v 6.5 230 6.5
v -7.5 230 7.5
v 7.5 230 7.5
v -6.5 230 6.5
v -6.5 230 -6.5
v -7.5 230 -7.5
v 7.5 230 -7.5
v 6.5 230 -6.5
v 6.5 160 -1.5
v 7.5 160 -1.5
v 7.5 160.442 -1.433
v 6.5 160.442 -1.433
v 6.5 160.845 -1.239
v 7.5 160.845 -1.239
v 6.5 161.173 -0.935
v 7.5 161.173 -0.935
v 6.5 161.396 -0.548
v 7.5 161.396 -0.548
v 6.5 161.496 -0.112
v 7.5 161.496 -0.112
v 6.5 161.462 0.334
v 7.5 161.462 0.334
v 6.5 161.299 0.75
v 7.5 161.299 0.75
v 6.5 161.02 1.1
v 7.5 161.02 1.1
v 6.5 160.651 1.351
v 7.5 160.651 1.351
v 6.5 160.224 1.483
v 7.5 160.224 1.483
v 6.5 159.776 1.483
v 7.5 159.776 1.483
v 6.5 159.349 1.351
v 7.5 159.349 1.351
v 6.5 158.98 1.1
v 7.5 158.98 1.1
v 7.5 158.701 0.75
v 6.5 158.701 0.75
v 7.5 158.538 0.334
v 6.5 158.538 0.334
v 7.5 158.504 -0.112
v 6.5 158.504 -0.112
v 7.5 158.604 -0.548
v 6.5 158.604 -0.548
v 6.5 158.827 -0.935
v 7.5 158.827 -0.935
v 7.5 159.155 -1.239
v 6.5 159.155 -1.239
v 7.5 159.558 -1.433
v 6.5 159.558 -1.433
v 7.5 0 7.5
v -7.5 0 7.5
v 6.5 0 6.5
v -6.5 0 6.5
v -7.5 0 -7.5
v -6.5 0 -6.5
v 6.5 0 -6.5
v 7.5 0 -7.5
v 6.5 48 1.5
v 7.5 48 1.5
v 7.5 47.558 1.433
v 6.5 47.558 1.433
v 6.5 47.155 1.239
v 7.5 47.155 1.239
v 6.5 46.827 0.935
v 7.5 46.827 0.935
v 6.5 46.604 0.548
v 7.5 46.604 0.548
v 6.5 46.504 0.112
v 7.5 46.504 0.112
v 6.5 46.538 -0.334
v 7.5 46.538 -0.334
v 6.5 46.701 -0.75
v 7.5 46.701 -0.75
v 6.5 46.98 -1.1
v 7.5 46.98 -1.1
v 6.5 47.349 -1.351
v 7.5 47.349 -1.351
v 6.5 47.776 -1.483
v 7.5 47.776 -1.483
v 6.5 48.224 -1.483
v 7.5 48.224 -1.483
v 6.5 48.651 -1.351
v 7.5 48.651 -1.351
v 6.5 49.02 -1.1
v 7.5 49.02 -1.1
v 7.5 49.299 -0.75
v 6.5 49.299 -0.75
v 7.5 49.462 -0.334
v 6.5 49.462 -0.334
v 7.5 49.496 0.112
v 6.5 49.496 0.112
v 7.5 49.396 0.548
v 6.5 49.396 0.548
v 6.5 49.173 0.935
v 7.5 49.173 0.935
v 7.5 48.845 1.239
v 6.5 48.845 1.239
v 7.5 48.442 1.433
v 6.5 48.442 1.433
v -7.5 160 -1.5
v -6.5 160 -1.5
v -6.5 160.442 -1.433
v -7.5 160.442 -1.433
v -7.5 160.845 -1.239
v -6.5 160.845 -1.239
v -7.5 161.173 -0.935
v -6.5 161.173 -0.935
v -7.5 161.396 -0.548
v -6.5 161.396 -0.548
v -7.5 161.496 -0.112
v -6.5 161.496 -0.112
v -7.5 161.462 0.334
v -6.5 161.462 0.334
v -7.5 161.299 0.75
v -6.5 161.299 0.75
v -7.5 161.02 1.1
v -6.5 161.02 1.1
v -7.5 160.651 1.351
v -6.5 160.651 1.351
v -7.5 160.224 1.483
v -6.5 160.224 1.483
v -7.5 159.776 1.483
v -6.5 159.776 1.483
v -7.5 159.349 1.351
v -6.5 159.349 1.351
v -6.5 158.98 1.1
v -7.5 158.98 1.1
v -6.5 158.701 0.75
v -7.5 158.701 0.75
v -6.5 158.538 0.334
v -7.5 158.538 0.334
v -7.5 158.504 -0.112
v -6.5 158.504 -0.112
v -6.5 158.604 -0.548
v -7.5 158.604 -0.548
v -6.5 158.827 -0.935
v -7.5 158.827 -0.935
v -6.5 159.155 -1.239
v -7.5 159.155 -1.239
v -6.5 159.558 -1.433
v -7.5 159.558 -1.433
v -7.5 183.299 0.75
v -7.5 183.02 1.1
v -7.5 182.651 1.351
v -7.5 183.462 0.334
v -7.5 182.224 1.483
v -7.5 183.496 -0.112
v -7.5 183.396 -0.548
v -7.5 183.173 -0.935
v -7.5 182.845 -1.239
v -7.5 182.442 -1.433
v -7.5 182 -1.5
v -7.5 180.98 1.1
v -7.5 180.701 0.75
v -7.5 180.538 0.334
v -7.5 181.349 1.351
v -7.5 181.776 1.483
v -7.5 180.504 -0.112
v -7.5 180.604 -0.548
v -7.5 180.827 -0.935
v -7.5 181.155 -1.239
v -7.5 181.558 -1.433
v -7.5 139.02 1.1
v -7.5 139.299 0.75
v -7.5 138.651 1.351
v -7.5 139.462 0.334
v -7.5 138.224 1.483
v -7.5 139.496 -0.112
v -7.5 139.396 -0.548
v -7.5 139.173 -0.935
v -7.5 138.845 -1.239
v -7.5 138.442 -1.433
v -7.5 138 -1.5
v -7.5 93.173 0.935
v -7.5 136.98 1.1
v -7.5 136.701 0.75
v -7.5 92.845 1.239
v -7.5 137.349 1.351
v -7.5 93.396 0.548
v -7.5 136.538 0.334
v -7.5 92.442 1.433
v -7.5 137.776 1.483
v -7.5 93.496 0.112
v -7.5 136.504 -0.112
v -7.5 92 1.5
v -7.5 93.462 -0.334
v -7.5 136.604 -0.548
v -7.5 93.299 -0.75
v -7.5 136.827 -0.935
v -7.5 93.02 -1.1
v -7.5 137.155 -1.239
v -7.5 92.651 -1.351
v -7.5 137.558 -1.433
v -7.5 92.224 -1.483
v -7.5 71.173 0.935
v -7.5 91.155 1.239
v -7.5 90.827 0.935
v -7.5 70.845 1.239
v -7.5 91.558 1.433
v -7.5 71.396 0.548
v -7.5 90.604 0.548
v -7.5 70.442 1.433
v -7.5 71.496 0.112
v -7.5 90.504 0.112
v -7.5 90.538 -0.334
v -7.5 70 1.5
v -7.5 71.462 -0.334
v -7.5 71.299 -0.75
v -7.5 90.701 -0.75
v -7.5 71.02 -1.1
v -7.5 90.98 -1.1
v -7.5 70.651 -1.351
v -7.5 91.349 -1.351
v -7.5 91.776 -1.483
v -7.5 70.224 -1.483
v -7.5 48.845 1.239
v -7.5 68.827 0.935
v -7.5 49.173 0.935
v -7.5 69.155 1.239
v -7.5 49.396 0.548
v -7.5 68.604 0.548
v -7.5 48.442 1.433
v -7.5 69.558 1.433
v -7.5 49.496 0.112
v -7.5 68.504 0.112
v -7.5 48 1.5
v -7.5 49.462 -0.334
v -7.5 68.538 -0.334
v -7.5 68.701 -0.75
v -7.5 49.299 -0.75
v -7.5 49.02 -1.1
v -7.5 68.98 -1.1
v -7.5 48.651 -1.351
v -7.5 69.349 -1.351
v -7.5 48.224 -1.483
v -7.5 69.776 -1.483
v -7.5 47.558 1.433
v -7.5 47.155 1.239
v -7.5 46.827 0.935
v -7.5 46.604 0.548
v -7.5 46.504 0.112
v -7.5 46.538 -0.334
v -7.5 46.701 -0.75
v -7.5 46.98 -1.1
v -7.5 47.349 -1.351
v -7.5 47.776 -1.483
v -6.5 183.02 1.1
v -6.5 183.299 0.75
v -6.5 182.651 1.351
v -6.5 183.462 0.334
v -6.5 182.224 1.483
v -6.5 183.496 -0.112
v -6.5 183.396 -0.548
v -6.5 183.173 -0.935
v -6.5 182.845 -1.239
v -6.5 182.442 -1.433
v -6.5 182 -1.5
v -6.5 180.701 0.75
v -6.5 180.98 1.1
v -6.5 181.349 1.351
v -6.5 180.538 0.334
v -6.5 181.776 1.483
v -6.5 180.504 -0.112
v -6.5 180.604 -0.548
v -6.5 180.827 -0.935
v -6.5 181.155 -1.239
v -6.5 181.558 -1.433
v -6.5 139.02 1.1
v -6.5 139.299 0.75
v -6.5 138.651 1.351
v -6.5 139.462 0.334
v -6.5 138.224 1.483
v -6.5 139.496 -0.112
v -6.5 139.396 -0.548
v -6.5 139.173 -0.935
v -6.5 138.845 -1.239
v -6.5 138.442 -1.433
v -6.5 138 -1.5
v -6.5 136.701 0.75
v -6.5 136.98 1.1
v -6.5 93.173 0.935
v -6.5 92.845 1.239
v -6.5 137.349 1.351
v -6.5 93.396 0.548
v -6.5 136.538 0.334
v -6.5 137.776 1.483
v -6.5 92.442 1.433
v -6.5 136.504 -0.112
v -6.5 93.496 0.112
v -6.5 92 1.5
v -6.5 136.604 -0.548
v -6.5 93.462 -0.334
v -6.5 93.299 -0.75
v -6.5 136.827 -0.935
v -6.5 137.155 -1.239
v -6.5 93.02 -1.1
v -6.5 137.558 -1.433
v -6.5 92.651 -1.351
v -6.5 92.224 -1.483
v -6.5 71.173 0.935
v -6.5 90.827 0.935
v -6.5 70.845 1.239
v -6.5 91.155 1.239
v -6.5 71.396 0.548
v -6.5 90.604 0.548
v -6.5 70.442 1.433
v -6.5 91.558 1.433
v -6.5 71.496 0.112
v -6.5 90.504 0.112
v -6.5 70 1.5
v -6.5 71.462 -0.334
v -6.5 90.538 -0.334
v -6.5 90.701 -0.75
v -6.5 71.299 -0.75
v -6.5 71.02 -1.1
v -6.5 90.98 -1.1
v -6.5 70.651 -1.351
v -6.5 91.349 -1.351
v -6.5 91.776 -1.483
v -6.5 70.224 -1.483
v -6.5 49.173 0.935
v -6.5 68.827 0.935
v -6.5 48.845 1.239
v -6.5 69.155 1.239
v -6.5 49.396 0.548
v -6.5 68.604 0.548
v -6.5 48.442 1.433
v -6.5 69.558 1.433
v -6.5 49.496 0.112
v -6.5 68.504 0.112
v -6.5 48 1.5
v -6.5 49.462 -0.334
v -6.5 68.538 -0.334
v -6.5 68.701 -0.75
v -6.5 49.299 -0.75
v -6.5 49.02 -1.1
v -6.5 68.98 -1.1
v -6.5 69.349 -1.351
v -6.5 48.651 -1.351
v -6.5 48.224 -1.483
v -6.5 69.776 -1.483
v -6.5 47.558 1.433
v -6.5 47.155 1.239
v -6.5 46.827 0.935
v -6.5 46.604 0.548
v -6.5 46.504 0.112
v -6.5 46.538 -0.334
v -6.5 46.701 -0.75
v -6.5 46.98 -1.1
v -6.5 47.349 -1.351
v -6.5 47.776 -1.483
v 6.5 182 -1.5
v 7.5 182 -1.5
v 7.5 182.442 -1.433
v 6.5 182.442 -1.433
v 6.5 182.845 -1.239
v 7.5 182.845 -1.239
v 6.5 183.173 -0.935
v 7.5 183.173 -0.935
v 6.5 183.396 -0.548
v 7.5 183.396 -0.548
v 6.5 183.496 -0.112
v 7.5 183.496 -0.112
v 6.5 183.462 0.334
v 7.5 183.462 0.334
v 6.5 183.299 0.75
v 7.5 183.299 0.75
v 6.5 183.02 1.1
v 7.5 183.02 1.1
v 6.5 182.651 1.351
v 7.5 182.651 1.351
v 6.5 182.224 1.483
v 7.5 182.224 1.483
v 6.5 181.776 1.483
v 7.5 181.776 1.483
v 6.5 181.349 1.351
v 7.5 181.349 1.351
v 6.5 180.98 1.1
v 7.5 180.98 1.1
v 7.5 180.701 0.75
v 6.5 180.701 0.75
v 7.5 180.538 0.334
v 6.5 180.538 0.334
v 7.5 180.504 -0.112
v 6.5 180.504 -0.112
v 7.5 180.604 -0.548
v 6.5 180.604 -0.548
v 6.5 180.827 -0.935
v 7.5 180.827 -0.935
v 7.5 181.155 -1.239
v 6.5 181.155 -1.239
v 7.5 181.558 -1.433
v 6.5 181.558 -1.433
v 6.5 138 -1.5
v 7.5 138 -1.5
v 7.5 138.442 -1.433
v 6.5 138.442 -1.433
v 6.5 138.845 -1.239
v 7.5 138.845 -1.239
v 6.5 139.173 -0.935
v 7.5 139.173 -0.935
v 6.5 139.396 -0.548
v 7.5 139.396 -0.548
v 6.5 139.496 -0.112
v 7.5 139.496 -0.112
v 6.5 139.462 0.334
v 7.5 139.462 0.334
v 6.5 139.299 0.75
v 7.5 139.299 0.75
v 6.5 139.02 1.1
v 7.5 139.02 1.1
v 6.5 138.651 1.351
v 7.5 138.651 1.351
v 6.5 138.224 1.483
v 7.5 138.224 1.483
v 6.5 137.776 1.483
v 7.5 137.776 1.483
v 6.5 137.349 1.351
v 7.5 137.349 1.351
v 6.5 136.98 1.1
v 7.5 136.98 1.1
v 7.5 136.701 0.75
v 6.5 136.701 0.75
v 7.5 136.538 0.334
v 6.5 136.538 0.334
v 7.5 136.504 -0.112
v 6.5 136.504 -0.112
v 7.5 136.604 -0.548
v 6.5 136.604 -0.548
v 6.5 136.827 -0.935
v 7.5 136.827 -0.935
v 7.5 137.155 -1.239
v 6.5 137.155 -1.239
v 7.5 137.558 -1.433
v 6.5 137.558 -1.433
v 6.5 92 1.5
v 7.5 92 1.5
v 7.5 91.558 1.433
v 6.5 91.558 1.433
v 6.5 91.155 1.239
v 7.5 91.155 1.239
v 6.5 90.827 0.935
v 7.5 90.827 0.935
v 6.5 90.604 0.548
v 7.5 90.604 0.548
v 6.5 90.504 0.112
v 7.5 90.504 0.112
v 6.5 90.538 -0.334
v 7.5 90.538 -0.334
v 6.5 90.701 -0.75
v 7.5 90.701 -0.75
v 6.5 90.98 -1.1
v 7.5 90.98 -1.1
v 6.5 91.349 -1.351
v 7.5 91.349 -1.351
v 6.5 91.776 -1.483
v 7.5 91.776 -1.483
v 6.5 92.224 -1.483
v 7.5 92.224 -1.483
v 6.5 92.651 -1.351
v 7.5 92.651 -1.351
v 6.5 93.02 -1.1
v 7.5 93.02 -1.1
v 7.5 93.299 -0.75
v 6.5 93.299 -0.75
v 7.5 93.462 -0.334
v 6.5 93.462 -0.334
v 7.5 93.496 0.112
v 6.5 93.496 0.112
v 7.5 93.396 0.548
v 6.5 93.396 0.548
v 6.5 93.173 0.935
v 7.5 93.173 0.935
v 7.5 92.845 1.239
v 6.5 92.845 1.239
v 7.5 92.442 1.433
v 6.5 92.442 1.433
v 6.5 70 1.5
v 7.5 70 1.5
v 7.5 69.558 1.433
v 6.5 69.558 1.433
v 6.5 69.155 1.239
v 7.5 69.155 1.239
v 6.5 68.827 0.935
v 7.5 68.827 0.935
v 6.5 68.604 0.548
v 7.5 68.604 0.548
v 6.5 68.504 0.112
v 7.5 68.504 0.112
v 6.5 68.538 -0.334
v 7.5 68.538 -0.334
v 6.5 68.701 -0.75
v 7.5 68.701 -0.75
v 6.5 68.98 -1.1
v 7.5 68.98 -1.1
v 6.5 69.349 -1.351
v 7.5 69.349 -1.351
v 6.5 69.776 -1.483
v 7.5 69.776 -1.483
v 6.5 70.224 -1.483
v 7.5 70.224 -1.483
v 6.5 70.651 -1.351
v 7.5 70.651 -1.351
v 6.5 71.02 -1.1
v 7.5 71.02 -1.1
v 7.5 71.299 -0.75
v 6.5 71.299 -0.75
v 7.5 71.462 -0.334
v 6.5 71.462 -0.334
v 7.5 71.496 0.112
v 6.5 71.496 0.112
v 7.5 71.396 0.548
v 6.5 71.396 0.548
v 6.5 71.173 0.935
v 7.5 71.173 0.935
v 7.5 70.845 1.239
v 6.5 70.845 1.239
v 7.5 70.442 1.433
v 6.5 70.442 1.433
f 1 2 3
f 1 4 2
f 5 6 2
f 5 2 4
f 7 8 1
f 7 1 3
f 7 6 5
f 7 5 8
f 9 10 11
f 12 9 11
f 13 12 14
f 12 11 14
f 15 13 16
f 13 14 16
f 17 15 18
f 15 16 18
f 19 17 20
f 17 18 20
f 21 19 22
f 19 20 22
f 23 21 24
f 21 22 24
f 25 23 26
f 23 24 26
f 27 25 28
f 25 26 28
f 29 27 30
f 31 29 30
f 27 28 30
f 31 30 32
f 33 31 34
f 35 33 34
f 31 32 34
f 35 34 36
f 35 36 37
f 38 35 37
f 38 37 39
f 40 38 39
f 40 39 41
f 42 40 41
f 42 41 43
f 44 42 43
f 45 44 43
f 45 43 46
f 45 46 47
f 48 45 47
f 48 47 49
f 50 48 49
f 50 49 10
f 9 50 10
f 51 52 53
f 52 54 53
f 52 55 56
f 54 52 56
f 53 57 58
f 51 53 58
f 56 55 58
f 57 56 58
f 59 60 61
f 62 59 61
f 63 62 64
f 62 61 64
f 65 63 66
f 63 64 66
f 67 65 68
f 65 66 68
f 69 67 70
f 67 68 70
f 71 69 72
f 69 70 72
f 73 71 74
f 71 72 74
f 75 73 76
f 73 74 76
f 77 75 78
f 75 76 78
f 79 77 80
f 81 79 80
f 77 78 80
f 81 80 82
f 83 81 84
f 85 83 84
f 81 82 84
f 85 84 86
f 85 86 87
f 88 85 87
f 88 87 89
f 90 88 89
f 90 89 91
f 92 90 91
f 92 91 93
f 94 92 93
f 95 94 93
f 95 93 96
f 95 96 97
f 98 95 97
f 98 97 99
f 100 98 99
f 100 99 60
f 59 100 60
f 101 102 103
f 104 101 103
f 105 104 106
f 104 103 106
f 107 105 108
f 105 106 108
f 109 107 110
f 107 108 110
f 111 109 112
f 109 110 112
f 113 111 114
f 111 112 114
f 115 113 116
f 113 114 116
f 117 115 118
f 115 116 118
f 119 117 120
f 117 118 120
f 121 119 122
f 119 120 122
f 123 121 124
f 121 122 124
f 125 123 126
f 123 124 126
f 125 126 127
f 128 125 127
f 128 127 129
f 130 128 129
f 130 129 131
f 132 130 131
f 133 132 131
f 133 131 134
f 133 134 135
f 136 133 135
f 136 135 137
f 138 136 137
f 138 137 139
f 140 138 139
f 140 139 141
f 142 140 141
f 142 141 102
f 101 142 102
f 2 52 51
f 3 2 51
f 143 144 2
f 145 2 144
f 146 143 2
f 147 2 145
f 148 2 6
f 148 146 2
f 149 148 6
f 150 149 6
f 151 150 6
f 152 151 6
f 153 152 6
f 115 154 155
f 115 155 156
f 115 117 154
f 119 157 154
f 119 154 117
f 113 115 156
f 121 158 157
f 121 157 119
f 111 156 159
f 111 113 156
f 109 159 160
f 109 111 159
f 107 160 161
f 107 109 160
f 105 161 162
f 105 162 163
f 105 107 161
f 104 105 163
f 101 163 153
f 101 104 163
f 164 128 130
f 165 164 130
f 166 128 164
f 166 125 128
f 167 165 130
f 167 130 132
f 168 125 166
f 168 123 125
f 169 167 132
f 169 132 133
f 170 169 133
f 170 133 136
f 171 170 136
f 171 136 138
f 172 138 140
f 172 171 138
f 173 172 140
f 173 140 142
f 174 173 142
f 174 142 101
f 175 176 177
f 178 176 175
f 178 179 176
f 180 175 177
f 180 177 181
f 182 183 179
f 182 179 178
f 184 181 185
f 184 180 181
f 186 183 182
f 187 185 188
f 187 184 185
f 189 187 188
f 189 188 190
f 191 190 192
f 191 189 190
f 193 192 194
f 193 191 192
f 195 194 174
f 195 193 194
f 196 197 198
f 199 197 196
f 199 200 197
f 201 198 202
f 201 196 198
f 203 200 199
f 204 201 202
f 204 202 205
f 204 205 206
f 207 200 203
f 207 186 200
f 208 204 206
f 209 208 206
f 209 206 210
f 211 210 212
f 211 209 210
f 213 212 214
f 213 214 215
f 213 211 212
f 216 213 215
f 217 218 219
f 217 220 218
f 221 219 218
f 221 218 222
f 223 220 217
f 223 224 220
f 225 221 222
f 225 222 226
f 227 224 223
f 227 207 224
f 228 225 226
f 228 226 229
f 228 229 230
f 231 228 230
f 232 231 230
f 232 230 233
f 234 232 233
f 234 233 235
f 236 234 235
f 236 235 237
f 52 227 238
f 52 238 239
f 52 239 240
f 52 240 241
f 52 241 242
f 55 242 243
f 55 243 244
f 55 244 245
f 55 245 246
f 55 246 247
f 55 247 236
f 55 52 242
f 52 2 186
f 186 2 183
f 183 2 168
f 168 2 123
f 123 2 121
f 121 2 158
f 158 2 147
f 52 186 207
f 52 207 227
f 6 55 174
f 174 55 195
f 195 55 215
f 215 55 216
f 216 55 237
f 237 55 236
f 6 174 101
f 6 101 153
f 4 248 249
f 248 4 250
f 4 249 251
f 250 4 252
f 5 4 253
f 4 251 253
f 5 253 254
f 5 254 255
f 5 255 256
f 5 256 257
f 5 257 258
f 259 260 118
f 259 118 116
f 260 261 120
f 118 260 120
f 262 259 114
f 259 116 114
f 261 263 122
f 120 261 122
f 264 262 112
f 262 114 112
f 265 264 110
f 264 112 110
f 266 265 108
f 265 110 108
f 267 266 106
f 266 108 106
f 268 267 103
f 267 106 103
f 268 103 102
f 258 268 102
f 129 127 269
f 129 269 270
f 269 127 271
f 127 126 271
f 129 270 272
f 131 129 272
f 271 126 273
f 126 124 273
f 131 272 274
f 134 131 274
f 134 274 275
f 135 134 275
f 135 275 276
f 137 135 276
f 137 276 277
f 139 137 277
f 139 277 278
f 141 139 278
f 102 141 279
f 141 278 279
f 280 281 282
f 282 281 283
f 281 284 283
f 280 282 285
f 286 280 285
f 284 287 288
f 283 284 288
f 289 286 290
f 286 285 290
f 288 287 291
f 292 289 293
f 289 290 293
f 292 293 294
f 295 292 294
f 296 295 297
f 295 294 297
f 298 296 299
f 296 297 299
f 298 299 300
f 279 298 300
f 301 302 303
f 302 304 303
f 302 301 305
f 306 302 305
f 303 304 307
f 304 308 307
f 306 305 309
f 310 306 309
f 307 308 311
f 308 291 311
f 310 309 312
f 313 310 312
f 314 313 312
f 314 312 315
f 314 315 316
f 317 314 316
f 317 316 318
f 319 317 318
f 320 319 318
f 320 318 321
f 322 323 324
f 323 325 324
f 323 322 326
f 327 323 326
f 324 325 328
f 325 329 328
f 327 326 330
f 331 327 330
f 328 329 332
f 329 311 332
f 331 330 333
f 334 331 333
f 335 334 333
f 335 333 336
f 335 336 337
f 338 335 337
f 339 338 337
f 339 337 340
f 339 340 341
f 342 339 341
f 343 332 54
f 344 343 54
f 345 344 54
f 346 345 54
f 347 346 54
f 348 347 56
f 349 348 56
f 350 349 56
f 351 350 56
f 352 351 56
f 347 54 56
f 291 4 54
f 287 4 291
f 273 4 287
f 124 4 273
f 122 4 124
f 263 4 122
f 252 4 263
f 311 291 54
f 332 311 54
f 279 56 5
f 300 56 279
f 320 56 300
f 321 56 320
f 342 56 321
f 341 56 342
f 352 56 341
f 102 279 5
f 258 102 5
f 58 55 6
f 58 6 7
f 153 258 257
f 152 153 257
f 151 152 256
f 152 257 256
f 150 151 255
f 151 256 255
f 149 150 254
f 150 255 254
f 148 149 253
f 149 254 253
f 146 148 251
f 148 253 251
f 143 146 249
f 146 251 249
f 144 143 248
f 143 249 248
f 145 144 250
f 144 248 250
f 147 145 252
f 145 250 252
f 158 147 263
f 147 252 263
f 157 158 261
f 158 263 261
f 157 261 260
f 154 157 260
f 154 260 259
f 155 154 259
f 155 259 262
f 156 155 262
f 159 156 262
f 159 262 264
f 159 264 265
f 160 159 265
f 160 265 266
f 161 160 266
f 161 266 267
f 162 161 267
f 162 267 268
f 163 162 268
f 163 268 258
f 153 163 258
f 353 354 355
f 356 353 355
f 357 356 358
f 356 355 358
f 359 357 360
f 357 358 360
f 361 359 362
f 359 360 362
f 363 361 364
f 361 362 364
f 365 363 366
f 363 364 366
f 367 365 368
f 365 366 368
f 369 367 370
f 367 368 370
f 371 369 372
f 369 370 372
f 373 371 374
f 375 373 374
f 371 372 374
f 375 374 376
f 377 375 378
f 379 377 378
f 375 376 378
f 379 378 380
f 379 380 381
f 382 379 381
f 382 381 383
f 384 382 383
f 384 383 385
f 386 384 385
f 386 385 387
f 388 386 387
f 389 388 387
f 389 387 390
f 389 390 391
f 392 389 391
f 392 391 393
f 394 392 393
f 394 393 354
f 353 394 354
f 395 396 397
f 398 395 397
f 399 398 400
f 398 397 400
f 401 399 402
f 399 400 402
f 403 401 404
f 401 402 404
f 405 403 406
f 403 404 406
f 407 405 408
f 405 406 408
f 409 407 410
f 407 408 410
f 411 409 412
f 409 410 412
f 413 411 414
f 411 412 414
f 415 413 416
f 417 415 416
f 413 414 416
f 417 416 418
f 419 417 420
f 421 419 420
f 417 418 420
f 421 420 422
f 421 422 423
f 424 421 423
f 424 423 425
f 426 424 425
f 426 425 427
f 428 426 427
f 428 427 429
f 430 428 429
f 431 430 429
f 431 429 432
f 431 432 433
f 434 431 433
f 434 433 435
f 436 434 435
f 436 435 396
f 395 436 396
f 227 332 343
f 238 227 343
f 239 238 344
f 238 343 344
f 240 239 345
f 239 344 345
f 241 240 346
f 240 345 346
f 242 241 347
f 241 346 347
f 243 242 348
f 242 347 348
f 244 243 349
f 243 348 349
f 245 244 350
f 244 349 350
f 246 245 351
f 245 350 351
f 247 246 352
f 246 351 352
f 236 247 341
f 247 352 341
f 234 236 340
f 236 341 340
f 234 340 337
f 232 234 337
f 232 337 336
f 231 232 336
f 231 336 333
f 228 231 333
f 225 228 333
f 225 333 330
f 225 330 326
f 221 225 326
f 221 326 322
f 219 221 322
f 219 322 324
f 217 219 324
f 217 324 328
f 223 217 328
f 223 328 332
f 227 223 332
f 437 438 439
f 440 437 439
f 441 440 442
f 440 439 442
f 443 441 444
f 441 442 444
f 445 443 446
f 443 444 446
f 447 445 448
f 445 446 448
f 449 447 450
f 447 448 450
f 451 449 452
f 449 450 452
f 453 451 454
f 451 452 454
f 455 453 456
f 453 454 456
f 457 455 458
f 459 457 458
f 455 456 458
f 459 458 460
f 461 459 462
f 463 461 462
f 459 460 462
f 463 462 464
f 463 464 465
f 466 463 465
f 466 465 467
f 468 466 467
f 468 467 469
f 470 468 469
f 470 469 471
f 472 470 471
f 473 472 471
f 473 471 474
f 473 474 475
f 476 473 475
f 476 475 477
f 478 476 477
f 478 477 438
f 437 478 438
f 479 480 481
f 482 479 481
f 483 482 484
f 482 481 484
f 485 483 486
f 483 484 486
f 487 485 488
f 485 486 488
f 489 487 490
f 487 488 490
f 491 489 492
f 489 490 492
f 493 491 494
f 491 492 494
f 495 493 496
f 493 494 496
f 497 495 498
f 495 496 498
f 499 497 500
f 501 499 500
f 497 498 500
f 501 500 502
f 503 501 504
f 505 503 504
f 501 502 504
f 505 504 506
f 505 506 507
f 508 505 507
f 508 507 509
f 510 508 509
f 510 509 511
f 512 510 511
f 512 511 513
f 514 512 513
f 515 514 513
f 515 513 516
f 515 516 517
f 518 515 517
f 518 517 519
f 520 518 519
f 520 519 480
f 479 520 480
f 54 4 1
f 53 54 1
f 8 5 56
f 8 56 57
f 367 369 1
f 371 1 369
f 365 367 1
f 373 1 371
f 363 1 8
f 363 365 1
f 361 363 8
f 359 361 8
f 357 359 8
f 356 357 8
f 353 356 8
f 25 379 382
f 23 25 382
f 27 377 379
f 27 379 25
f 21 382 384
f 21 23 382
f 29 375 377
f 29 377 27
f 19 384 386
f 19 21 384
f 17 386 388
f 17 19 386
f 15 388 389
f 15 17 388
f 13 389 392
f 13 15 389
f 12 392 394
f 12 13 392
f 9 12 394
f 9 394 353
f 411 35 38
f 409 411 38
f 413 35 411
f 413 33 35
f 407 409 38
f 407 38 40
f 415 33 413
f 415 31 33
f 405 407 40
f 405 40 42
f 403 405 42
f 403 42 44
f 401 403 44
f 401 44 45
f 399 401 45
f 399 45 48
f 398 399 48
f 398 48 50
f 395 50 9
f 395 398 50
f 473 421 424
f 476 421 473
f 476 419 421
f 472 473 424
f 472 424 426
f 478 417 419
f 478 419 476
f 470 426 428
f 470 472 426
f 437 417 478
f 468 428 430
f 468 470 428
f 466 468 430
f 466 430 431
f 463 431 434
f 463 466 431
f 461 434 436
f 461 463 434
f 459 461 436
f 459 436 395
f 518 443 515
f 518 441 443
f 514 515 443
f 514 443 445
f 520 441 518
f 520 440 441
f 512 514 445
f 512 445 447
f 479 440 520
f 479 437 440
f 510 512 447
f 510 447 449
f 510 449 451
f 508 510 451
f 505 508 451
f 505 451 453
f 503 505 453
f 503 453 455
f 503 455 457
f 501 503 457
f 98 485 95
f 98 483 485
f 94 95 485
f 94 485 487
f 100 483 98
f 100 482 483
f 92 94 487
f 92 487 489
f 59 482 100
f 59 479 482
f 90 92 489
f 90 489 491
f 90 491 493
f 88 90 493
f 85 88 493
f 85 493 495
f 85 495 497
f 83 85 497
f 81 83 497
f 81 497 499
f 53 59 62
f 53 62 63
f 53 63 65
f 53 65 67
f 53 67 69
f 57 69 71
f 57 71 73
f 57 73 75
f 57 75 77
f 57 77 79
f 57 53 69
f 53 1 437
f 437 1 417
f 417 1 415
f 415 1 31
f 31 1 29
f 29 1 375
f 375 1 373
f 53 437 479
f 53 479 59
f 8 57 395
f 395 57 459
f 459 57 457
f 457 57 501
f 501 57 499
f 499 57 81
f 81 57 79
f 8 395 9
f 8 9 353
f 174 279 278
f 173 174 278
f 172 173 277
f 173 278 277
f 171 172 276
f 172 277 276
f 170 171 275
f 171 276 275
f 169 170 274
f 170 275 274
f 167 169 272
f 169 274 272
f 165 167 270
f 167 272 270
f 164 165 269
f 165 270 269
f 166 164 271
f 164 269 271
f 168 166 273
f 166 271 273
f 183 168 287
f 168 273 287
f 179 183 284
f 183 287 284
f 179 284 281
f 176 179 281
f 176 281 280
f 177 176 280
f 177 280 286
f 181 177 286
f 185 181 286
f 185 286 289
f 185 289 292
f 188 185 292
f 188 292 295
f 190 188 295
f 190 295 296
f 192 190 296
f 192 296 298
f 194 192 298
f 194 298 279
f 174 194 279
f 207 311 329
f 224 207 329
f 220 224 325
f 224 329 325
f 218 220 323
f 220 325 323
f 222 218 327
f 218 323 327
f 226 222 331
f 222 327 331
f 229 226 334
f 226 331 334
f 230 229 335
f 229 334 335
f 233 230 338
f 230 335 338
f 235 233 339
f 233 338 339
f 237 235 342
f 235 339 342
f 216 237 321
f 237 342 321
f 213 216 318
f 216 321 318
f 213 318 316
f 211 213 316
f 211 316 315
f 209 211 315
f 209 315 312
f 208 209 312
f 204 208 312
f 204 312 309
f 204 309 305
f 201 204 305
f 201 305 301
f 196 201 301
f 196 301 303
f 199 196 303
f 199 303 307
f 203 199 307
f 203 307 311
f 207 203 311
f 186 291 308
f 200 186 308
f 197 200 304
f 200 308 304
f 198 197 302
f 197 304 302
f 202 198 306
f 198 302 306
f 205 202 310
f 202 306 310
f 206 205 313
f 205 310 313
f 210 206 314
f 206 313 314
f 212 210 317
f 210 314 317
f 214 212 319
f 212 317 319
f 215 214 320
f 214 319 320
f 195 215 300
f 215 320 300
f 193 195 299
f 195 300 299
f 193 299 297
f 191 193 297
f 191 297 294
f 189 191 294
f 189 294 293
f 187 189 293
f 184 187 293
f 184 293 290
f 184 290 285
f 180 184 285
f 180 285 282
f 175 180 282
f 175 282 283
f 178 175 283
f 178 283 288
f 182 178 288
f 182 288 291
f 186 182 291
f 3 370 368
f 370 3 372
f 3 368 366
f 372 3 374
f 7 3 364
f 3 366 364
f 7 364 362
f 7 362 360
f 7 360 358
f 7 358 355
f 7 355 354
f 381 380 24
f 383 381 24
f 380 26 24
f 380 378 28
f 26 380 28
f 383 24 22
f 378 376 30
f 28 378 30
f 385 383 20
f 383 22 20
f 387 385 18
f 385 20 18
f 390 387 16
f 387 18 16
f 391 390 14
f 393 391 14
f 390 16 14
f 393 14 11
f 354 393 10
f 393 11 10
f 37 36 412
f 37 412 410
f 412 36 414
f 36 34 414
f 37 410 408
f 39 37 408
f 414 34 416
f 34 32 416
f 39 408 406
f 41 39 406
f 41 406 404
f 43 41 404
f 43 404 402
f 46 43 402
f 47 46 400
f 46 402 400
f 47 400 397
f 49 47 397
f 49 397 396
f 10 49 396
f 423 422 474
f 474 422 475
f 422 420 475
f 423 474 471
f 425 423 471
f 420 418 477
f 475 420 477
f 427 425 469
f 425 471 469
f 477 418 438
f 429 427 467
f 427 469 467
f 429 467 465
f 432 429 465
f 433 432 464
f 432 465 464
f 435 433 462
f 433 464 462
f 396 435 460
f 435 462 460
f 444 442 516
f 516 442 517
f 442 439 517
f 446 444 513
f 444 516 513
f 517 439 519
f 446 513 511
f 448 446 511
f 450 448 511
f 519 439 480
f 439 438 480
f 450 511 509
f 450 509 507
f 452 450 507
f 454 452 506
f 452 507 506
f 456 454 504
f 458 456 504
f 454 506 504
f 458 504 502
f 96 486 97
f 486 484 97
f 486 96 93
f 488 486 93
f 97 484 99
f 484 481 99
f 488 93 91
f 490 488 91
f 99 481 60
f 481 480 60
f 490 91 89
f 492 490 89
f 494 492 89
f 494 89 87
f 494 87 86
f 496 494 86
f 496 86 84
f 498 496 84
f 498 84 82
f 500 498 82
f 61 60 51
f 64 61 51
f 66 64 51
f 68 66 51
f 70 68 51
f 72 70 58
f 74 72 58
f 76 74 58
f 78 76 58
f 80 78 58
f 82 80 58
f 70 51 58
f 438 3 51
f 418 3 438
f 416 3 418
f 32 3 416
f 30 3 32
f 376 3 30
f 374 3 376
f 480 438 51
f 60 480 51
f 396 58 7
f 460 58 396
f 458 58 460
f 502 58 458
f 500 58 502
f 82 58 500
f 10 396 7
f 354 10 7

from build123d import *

# Parameters (mm, degrees)
SKETCH_1_W          = 15
SKETCH_1_H          = 15
SKETCH_1_W_2        = 13
SKETCH_1_H_2        = 13
EXTRUDE_1_DEPTH     = 230
SKETCH_2_R          = 1.5
CUT_EXTRUDE_1_DEPTH = 231.610602532


with BuildPart() as part:
    # 草图1 → 凸台-拉伸1 (new body)
    with BuildSketch(Plane(origin=(0, 0, 0), x_dir=(1, 0, 0), z_dir=(0, 1, 0))):
        Rectangle(SKETCH_1_W, SKETCH_1_H)
        Rectangle(SKETCH_1_W_2, SKETCH_1_H_2, mode=Mode.SUBTRACT)
    extrude(amount=EXTRUDE_1_DEPTH)

    # 草图2 → 切除-拉伸1 (cut, through all)
    with BuildSketch(Plane(origin=(7.5, 0, 0), x_dir=(0, 0, -1), z_dir=(1, 0, 0))):
        with Locations((0, 160)):
            Circle(SKETCH_2_R)
        with Locations((0, 138)):
            Circle(SKETCH_2_R)
        with Locations((0, 182)):
            Circle(SKETCH_2_R)
        with Locations(Location((0, 48, 0), (0, 0, 180))):
            Circle(SKETCH_2_R)
        with Locations(Location((0, 92, 0), (0, 0, 180))):
            Circle(SKETCH_2_R)
        with Locations(Location((0, 70, 0), (0, 0, 180))):
            Circle(SKETCH_2_R)
    extrude(amount=-CUT_EXTRUDE_1_DEPTH, mode=Mode.SUBTRACT)


solid = part.part
